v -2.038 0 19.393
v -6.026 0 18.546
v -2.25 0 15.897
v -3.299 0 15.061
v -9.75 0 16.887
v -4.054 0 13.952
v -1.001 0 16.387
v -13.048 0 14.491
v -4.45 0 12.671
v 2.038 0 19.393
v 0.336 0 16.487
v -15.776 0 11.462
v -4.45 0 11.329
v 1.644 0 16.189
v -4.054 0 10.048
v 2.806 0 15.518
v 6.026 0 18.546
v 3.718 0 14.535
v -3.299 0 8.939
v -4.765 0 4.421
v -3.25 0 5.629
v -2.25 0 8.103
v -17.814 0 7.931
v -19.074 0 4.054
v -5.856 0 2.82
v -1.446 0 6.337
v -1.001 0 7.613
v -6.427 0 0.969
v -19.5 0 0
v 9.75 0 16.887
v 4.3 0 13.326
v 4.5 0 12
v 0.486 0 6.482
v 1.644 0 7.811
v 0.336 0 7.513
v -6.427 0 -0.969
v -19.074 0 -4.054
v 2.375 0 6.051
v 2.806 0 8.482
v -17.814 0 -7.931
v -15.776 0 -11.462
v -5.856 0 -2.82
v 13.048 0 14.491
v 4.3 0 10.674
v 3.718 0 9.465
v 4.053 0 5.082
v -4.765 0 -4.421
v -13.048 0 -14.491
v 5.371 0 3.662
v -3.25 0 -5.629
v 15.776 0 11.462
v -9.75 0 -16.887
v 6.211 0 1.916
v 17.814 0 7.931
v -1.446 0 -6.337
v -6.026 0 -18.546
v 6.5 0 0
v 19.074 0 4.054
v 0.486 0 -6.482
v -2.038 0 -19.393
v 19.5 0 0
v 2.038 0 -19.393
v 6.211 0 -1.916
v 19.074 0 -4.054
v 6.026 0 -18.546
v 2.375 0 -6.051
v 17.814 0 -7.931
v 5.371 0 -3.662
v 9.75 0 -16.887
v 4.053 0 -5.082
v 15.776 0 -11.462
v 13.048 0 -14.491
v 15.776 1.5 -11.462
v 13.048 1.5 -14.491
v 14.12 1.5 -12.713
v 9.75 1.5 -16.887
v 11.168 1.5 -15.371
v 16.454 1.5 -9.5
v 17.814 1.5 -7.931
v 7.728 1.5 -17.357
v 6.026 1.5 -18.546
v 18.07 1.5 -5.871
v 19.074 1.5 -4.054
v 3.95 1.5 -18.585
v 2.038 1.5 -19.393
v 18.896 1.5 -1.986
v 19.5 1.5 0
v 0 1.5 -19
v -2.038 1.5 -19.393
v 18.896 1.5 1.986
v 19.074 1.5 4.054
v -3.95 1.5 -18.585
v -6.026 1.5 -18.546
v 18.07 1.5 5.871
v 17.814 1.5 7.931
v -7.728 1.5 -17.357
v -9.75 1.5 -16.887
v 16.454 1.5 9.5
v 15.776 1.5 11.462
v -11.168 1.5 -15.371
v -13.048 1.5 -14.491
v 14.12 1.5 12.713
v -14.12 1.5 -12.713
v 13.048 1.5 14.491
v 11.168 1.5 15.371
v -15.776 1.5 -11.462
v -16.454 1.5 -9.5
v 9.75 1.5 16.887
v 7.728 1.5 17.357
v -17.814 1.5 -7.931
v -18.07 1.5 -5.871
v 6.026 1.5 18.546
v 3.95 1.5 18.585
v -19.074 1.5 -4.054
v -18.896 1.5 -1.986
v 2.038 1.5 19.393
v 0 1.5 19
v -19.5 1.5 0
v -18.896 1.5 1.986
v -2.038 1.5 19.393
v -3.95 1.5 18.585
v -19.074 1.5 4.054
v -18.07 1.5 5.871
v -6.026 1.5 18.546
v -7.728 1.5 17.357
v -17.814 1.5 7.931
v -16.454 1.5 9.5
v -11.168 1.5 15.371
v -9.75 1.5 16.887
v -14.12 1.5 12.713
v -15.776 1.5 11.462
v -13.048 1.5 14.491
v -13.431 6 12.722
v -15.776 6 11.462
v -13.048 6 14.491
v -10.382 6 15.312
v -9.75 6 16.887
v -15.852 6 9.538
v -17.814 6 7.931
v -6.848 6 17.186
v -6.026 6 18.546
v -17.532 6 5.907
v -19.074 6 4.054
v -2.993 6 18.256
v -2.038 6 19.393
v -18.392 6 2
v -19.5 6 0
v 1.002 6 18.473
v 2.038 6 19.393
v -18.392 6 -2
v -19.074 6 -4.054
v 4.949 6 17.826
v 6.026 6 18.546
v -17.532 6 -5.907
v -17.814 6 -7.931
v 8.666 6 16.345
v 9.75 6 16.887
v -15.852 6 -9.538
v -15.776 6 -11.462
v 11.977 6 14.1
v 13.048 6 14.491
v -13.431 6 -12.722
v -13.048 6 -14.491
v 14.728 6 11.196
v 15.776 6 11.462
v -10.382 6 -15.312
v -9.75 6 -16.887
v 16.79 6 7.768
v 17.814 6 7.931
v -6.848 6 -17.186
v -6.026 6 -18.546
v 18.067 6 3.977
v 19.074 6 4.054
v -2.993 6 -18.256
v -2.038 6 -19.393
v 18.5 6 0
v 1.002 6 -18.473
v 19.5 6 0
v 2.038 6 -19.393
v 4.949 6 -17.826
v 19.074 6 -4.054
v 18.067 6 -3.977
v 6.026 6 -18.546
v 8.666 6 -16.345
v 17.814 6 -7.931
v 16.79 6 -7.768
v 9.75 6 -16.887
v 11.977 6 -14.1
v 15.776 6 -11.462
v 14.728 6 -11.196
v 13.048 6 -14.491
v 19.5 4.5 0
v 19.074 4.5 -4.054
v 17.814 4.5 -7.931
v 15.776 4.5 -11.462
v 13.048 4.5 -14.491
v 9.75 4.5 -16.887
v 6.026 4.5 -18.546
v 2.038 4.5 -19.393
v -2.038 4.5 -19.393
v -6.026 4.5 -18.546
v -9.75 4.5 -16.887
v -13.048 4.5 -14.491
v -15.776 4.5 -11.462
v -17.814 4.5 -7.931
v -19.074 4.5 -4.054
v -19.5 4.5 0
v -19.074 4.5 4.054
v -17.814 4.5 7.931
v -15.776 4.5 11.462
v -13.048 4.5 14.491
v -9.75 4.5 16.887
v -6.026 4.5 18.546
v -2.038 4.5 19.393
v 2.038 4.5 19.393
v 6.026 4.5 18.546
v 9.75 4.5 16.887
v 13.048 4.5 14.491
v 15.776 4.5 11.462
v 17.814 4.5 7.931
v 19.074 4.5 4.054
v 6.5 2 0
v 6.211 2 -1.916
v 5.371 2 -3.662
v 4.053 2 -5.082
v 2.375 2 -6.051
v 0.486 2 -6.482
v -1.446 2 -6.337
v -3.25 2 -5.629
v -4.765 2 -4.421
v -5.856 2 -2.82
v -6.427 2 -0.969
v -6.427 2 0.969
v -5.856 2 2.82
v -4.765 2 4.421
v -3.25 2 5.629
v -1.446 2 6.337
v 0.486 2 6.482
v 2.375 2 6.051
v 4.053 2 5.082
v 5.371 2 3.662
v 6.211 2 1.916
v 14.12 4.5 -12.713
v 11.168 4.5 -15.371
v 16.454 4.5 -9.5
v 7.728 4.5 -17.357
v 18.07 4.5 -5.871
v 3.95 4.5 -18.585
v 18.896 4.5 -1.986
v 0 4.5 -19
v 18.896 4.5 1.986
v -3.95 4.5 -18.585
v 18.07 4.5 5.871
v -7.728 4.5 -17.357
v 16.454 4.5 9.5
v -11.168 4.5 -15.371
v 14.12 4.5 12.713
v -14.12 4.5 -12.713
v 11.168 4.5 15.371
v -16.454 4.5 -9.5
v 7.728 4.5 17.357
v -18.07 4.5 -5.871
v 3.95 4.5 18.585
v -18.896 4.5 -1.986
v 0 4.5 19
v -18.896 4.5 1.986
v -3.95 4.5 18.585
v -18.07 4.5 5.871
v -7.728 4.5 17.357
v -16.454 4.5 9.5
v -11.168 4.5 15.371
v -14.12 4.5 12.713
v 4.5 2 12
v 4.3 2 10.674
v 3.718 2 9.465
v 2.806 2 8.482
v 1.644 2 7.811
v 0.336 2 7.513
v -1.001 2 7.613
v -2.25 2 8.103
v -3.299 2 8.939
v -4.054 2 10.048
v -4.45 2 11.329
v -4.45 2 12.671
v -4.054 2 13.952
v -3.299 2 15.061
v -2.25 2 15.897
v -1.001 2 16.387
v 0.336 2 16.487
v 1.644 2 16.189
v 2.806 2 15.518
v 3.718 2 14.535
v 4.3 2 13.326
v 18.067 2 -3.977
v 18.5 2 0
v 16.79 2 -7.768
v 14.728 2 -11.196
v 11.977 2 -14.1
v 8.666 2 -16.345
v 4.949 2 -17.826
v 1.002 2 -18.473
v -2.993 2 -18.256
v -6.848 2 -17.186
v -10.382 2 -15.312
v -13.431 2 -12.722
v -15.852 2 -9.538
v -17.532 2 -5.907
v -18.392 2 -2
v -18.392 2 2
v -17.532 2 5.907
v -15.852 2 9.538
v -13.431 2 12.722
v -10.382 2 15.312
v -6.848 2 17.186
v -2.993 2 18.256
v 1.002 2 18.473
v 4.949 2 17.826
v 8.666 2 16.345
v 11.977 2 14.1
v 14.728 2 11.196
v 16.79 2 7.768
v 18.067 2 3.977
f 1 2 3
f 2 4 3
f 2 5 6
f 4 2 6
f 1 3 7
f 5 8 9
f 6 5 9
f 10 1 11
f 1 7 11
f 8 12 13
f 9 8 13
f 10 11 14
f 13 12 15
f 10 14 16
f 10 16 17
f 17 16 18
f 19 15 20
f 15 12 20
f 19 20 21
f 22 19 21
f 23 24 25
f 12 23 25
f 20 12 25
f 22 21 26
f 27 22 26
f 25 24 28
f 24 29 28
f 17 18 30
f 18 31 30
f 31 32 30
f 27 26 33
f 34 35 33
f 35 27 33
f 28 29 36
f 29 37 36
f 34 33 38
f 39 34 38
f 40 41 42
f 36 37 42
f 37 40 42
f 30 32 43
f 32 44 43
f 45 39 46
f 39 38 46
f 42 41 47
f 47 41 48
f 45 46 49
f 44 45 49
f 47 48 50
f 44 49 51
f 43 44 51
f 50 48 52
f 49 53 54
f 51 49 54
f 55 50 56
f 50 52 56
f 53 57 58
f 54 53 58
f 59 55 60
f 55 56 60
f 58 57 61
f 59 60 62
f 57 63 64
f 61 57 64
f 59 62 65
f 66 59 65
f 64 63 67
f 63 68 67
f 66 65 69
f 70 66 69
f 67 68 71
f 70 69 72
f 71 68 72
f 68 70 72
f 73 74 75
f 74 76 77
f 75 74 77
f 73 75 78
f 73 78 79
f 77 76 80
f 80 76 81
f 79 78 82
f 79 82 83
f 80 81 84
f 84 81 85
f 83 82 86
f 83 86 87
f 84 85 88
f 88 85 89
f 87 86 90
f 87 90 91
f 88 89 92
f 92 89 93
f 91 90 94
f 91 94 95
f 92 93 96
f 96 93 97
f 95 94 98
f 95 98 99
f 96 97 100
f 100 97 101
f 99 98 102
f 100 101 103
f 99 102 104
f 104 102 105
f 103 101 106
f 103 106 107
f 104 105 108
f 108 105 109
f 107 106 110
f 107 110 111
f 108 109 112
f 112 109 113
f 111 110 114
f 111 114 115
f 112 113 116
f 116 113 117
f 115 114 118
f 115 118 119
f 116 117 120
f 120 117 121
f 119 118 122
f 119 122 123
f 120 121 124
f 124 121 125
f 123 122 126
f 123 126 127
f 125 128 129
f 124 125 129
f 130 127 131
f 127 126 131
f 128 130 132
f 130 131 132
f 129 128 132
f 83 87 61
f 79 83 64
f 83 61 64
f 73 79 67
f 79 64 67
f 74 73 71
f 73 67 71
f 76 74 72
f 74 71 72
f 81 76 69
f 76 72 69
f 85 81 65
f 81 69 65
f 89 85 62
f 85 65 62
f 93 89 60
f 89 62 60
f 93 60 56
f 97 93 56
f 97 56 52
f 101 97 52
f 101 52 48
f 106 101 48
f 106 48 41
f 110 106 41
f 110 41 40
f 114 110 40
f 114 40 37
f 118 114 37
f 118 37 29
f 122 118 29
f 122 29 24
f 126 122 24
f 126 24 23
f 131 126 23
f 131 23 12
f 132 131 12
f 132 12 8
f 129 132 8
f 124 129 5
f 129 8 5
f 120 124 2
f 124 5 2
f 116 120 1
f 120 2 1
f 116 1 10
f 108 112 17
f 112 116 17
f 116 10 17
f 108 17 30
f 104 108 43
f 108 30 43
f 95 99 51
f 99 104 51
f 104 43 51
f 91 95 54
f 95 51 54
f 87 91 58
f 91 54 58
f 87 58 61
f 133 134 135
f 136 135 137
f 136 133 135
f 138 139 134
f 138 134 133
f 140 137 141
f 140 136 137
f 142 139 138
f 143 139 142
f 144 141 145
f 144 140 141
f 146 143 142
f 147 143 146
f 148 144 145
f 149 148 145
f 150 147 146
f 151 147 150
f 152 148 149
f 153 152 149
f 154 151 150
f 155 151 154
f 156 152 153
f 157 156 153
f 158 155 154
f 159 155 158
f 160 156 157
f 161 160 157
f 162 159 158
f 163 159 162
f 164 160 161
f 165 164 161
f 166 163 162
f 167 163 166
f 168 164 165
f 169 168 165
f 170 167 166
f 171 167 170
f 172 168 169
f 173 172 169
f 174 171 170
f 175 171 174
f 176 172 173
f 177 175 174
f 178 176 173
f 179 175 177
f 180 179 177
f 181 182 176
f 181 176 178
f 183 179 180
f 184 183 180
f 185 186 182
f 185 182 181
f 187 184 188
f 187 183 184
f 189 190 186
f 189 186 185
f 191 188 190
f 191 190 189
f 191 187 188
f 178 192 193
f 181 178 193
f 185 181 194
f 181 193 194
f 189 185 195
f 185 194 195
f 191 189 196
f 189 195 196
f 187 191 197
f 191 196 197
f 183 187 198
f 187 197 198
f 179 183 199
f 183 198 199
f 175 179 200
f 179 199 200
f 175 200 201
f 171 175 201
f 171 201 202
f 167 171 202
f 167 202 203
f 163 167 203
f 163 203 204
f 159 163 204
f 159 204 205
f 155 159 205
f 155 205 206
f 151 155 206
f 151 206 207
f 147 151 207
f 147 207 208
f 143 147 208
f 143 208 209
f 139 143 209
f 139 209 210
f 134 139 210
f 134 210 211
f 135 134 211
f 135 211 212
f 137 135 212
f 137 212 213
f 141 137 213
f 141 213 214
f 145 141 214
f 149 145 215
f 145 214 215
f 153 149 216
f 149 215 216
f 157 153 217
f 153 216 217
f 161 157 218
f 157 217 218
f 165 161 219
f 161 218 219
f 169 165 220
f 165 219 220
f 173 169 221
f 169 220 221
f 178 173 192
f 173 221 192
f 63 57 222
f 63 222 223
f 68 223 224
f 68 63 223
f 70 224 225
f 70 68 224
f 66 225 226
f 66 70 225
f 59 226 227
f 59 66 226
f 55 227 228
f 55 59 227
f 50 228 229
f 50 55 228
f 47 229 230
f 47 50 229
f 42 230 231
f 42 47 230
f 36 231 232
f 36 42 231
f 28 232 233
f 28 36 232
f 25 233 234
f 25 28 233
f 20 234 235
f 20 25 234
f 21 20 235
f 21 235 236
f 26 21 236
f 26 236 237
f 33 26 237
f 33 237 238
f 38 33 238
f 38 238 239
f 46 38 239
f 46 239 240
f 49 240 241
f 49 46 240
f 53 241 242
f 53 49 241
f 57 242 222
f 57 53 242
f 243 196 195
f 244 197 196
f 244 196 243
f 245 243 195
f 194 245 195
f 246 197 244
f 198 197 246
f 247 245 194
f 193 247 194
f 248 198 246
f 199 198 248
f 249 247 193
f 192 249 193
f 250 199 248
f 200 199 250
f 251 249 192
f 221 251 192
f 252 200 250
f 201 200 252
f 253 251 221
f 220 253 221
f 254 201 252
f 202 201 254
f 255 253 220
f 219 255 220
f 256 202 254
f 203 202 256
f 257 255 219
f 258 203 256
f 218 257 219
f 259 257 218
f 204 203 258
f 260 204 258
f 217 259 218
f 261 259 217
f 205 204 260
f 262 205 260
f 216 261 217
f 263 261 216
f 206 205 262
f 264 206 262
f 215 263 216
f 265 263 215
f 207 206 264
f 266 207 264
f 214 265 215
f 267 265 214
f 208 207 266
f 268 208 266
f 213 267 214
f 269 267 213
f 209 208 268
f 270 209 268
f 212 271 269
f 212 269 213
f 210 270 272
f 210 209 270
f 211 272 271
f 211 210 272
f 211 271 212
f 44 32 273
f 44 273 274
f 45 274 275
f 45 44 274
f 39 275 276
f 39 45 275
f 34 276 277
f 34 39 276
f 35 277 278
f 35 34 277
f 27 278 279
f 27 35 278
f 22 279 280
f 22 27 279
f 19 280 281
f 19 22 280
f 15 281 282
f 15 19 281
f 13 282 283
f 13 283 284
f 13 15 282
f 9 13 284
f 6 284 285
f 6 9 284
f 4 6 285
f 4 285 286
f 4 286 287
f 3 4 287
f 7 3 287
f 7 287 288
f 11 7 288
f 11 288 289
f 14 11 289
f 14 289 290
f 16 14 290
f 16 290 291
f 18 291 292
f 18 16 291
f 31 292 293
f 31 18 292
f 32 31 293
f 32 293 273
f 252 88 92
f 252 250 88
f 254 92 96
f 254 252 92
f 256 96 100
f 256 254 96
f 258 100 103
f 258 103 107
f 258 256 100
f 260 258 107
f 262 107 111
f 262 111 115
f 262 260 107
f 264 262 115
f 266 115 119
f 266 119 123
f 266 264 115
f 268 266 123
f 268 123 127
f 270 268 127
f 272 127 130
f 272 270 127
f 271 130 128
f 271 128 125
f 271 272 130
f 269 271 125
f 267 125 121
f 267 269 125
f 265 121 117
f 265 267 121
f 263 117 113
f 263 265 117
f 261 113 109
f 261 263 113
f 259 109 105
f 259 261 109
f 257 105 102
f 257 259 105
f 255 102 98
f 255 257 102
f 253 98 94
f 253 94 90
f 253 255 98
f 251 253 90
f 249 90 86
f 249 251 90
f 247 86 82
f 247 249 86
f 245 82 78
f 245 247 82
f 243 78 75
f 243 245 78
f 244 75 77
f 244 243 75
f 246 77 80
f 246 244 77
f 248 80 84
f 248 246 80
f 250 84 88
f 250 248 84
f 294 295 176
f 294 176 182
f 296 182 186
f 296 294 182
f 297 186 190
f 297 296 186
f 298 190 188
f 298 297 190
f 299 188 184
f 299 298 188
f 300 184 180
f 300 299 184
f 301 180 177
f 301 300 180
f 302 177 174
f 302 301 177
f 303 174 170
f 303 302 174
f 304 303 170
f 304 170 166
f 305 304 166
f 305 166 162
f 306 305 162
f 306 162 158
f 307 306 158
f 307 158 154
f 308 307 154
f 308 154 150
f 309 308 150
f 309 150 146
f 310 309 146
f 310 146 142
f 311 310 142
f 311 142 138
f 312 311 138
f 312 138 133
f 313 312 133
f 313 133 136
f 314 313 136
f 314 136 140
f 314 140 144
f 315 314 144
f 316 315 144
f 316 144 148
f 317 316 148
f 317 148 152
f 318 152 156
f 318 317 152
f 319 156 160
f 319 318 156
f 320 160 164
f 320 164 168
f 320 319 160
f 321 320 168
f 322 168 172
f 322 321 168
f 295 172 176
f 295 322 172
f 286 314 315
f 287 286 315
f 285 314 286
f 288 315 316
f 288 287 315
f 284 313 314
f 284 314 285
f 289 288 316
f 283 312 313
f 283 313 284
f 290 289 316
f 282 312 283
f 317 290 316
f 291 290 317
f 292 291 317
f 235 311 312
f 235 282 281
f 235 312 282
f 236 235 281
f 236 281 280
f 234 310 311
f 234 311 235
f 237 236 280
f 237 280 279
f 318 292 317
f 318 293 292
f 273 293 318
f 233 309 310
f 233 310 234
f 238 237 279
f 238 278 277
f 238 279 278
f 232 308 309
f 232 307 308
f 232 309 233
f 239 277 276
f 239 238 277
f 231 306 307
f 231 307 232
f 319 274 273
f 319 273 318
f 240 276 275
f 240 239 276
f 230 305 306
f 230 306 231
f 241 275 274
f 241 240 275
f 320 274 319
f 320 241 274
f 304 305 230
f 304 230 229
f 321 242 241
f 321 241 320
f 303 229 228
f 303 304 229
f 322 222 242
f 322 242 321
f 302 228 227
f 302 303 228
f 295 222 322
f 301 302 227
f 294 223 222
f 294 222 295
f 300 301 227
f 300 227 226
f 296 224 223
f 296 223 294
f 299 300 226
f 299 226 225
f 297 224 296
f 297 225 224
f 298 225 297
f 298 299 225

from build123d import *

# Parameters (mm, degrees)
SKETCH2_R      = 19.5
SKETCH2_R_2    = 4.5
SKETCH2_R_3    = 6.5
LIDBASE_DEPTH  = 2
SKETCH2_4_R    = 19.5
SKETCH2_4_R_2  = 18.5
LIDWALLS_DEPTH = 6
SKETCH3_W      = 0.5
SKETCH3_H      = 3


with BuildPart() as part:
    # Sketch2 → LidBase (new body)
    with BuildSketch(Plane(origin=(0, 0, 0), x_dir=(1, 0, 0), z_dir=(0, 1, 0))):
        Circle(SKETCH2_R)
        with Locations((0, -12)):
            Circle(SKETCH2_R_2, mode=Mode.SUBTRACT)
        Circle(SKETCH2_R_3, mode=Mode.SUBTRACT)
    extrude(amount=LIDBASE_DEPTH)

    # Sketch2<4> → LidWalls (add)
    with BuildSketch(Plane(origin=(0, 0, 0), x_dir=(1, 0, 0), z_dir=(0, 1, 0))):
        Circle(SKETCH2_4_R)
        Circle(SKETCH2_4_R_2, mode=Mode.SUBTRACT)
    extrude(amount=LIDWALLS_DEPTH)

    # Sketch3 → Beltgrooves (revolve, cut)
    with BuildSketch(Plane(origin=(0, 0, 0), x_dir=(0, 0, -1), z_dir=(1, 0, 0))):
        with Locations((19.25, 3)):
            Rectangle(SKETCH3_W, SKETCH3_H)
    revolve(axis=Axis((0, 0, 0), (0, 1, 0)), mode=Mode.SUBTRACT)


solid = part.part
